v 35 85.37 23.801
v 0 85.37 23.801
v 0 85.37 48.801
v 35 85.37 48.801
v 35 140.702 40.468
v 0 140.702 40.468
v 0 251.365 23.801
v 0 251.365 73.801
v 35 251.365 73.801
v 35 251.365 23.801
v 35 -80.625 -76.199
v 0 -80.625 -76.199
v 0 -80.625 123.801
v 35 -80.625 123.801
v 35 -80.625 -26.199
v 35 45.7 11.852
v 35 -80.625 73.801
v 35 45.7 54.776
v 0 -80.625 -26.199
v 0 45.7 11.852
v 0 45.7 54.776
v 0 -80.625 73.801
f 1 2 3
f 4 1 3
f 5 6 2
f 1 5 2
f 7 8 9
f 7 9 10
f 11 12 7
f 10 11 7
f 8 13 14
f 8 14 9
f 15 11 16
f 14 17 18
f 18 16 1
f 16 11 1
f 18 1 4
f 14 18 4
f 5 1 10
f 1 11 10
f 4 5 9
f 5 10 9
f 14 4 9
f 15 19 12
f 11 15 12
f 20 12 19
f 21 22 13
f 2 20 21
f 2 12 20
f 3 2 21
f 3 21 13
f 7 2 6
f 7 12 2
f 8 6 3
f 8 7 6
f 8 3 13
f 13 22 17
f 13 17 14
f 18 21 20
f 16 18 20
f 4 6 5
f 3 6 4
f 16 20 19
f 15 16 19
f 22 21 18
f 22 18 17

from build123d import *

# Parameters (mm, degrees)
SALIENTE_EXTRUIR1_DEPTH = 35


with BuildPart() as part:
    # Croquis3 → Saliente-Extruir1 (new body)
    with BuildSketch(Plane(origin=(0, 0, 0), x_dir=(0, 0, -1), z_dir=(1, 0, 0))):
        Polygon((-73.800980209, -80.62474503), (-123.800980209, -80.62474503), (-73.800980209, 251.36525497), (-23.800980209, 251.36525497), align=None)
        Polygon((-48.800980209, 85.37025497), (-54.775537144, 45.700391836), (-11.85186634, 45.700391836), (-23.800980209, 85.37025497), align=None)
        Polygon((-23.800980209, 85.37025497), (-11.85186634, 45.700391836), (26.199019791, -80.62474503), (76.199019791, -80.62474503), (-23.800980209, 251.36525497), (-40.467646876, 140.701921636), align=None)
    extrude(amount=SALIENTE_EXTRUIR1_DEPTH)


solid = part.part
